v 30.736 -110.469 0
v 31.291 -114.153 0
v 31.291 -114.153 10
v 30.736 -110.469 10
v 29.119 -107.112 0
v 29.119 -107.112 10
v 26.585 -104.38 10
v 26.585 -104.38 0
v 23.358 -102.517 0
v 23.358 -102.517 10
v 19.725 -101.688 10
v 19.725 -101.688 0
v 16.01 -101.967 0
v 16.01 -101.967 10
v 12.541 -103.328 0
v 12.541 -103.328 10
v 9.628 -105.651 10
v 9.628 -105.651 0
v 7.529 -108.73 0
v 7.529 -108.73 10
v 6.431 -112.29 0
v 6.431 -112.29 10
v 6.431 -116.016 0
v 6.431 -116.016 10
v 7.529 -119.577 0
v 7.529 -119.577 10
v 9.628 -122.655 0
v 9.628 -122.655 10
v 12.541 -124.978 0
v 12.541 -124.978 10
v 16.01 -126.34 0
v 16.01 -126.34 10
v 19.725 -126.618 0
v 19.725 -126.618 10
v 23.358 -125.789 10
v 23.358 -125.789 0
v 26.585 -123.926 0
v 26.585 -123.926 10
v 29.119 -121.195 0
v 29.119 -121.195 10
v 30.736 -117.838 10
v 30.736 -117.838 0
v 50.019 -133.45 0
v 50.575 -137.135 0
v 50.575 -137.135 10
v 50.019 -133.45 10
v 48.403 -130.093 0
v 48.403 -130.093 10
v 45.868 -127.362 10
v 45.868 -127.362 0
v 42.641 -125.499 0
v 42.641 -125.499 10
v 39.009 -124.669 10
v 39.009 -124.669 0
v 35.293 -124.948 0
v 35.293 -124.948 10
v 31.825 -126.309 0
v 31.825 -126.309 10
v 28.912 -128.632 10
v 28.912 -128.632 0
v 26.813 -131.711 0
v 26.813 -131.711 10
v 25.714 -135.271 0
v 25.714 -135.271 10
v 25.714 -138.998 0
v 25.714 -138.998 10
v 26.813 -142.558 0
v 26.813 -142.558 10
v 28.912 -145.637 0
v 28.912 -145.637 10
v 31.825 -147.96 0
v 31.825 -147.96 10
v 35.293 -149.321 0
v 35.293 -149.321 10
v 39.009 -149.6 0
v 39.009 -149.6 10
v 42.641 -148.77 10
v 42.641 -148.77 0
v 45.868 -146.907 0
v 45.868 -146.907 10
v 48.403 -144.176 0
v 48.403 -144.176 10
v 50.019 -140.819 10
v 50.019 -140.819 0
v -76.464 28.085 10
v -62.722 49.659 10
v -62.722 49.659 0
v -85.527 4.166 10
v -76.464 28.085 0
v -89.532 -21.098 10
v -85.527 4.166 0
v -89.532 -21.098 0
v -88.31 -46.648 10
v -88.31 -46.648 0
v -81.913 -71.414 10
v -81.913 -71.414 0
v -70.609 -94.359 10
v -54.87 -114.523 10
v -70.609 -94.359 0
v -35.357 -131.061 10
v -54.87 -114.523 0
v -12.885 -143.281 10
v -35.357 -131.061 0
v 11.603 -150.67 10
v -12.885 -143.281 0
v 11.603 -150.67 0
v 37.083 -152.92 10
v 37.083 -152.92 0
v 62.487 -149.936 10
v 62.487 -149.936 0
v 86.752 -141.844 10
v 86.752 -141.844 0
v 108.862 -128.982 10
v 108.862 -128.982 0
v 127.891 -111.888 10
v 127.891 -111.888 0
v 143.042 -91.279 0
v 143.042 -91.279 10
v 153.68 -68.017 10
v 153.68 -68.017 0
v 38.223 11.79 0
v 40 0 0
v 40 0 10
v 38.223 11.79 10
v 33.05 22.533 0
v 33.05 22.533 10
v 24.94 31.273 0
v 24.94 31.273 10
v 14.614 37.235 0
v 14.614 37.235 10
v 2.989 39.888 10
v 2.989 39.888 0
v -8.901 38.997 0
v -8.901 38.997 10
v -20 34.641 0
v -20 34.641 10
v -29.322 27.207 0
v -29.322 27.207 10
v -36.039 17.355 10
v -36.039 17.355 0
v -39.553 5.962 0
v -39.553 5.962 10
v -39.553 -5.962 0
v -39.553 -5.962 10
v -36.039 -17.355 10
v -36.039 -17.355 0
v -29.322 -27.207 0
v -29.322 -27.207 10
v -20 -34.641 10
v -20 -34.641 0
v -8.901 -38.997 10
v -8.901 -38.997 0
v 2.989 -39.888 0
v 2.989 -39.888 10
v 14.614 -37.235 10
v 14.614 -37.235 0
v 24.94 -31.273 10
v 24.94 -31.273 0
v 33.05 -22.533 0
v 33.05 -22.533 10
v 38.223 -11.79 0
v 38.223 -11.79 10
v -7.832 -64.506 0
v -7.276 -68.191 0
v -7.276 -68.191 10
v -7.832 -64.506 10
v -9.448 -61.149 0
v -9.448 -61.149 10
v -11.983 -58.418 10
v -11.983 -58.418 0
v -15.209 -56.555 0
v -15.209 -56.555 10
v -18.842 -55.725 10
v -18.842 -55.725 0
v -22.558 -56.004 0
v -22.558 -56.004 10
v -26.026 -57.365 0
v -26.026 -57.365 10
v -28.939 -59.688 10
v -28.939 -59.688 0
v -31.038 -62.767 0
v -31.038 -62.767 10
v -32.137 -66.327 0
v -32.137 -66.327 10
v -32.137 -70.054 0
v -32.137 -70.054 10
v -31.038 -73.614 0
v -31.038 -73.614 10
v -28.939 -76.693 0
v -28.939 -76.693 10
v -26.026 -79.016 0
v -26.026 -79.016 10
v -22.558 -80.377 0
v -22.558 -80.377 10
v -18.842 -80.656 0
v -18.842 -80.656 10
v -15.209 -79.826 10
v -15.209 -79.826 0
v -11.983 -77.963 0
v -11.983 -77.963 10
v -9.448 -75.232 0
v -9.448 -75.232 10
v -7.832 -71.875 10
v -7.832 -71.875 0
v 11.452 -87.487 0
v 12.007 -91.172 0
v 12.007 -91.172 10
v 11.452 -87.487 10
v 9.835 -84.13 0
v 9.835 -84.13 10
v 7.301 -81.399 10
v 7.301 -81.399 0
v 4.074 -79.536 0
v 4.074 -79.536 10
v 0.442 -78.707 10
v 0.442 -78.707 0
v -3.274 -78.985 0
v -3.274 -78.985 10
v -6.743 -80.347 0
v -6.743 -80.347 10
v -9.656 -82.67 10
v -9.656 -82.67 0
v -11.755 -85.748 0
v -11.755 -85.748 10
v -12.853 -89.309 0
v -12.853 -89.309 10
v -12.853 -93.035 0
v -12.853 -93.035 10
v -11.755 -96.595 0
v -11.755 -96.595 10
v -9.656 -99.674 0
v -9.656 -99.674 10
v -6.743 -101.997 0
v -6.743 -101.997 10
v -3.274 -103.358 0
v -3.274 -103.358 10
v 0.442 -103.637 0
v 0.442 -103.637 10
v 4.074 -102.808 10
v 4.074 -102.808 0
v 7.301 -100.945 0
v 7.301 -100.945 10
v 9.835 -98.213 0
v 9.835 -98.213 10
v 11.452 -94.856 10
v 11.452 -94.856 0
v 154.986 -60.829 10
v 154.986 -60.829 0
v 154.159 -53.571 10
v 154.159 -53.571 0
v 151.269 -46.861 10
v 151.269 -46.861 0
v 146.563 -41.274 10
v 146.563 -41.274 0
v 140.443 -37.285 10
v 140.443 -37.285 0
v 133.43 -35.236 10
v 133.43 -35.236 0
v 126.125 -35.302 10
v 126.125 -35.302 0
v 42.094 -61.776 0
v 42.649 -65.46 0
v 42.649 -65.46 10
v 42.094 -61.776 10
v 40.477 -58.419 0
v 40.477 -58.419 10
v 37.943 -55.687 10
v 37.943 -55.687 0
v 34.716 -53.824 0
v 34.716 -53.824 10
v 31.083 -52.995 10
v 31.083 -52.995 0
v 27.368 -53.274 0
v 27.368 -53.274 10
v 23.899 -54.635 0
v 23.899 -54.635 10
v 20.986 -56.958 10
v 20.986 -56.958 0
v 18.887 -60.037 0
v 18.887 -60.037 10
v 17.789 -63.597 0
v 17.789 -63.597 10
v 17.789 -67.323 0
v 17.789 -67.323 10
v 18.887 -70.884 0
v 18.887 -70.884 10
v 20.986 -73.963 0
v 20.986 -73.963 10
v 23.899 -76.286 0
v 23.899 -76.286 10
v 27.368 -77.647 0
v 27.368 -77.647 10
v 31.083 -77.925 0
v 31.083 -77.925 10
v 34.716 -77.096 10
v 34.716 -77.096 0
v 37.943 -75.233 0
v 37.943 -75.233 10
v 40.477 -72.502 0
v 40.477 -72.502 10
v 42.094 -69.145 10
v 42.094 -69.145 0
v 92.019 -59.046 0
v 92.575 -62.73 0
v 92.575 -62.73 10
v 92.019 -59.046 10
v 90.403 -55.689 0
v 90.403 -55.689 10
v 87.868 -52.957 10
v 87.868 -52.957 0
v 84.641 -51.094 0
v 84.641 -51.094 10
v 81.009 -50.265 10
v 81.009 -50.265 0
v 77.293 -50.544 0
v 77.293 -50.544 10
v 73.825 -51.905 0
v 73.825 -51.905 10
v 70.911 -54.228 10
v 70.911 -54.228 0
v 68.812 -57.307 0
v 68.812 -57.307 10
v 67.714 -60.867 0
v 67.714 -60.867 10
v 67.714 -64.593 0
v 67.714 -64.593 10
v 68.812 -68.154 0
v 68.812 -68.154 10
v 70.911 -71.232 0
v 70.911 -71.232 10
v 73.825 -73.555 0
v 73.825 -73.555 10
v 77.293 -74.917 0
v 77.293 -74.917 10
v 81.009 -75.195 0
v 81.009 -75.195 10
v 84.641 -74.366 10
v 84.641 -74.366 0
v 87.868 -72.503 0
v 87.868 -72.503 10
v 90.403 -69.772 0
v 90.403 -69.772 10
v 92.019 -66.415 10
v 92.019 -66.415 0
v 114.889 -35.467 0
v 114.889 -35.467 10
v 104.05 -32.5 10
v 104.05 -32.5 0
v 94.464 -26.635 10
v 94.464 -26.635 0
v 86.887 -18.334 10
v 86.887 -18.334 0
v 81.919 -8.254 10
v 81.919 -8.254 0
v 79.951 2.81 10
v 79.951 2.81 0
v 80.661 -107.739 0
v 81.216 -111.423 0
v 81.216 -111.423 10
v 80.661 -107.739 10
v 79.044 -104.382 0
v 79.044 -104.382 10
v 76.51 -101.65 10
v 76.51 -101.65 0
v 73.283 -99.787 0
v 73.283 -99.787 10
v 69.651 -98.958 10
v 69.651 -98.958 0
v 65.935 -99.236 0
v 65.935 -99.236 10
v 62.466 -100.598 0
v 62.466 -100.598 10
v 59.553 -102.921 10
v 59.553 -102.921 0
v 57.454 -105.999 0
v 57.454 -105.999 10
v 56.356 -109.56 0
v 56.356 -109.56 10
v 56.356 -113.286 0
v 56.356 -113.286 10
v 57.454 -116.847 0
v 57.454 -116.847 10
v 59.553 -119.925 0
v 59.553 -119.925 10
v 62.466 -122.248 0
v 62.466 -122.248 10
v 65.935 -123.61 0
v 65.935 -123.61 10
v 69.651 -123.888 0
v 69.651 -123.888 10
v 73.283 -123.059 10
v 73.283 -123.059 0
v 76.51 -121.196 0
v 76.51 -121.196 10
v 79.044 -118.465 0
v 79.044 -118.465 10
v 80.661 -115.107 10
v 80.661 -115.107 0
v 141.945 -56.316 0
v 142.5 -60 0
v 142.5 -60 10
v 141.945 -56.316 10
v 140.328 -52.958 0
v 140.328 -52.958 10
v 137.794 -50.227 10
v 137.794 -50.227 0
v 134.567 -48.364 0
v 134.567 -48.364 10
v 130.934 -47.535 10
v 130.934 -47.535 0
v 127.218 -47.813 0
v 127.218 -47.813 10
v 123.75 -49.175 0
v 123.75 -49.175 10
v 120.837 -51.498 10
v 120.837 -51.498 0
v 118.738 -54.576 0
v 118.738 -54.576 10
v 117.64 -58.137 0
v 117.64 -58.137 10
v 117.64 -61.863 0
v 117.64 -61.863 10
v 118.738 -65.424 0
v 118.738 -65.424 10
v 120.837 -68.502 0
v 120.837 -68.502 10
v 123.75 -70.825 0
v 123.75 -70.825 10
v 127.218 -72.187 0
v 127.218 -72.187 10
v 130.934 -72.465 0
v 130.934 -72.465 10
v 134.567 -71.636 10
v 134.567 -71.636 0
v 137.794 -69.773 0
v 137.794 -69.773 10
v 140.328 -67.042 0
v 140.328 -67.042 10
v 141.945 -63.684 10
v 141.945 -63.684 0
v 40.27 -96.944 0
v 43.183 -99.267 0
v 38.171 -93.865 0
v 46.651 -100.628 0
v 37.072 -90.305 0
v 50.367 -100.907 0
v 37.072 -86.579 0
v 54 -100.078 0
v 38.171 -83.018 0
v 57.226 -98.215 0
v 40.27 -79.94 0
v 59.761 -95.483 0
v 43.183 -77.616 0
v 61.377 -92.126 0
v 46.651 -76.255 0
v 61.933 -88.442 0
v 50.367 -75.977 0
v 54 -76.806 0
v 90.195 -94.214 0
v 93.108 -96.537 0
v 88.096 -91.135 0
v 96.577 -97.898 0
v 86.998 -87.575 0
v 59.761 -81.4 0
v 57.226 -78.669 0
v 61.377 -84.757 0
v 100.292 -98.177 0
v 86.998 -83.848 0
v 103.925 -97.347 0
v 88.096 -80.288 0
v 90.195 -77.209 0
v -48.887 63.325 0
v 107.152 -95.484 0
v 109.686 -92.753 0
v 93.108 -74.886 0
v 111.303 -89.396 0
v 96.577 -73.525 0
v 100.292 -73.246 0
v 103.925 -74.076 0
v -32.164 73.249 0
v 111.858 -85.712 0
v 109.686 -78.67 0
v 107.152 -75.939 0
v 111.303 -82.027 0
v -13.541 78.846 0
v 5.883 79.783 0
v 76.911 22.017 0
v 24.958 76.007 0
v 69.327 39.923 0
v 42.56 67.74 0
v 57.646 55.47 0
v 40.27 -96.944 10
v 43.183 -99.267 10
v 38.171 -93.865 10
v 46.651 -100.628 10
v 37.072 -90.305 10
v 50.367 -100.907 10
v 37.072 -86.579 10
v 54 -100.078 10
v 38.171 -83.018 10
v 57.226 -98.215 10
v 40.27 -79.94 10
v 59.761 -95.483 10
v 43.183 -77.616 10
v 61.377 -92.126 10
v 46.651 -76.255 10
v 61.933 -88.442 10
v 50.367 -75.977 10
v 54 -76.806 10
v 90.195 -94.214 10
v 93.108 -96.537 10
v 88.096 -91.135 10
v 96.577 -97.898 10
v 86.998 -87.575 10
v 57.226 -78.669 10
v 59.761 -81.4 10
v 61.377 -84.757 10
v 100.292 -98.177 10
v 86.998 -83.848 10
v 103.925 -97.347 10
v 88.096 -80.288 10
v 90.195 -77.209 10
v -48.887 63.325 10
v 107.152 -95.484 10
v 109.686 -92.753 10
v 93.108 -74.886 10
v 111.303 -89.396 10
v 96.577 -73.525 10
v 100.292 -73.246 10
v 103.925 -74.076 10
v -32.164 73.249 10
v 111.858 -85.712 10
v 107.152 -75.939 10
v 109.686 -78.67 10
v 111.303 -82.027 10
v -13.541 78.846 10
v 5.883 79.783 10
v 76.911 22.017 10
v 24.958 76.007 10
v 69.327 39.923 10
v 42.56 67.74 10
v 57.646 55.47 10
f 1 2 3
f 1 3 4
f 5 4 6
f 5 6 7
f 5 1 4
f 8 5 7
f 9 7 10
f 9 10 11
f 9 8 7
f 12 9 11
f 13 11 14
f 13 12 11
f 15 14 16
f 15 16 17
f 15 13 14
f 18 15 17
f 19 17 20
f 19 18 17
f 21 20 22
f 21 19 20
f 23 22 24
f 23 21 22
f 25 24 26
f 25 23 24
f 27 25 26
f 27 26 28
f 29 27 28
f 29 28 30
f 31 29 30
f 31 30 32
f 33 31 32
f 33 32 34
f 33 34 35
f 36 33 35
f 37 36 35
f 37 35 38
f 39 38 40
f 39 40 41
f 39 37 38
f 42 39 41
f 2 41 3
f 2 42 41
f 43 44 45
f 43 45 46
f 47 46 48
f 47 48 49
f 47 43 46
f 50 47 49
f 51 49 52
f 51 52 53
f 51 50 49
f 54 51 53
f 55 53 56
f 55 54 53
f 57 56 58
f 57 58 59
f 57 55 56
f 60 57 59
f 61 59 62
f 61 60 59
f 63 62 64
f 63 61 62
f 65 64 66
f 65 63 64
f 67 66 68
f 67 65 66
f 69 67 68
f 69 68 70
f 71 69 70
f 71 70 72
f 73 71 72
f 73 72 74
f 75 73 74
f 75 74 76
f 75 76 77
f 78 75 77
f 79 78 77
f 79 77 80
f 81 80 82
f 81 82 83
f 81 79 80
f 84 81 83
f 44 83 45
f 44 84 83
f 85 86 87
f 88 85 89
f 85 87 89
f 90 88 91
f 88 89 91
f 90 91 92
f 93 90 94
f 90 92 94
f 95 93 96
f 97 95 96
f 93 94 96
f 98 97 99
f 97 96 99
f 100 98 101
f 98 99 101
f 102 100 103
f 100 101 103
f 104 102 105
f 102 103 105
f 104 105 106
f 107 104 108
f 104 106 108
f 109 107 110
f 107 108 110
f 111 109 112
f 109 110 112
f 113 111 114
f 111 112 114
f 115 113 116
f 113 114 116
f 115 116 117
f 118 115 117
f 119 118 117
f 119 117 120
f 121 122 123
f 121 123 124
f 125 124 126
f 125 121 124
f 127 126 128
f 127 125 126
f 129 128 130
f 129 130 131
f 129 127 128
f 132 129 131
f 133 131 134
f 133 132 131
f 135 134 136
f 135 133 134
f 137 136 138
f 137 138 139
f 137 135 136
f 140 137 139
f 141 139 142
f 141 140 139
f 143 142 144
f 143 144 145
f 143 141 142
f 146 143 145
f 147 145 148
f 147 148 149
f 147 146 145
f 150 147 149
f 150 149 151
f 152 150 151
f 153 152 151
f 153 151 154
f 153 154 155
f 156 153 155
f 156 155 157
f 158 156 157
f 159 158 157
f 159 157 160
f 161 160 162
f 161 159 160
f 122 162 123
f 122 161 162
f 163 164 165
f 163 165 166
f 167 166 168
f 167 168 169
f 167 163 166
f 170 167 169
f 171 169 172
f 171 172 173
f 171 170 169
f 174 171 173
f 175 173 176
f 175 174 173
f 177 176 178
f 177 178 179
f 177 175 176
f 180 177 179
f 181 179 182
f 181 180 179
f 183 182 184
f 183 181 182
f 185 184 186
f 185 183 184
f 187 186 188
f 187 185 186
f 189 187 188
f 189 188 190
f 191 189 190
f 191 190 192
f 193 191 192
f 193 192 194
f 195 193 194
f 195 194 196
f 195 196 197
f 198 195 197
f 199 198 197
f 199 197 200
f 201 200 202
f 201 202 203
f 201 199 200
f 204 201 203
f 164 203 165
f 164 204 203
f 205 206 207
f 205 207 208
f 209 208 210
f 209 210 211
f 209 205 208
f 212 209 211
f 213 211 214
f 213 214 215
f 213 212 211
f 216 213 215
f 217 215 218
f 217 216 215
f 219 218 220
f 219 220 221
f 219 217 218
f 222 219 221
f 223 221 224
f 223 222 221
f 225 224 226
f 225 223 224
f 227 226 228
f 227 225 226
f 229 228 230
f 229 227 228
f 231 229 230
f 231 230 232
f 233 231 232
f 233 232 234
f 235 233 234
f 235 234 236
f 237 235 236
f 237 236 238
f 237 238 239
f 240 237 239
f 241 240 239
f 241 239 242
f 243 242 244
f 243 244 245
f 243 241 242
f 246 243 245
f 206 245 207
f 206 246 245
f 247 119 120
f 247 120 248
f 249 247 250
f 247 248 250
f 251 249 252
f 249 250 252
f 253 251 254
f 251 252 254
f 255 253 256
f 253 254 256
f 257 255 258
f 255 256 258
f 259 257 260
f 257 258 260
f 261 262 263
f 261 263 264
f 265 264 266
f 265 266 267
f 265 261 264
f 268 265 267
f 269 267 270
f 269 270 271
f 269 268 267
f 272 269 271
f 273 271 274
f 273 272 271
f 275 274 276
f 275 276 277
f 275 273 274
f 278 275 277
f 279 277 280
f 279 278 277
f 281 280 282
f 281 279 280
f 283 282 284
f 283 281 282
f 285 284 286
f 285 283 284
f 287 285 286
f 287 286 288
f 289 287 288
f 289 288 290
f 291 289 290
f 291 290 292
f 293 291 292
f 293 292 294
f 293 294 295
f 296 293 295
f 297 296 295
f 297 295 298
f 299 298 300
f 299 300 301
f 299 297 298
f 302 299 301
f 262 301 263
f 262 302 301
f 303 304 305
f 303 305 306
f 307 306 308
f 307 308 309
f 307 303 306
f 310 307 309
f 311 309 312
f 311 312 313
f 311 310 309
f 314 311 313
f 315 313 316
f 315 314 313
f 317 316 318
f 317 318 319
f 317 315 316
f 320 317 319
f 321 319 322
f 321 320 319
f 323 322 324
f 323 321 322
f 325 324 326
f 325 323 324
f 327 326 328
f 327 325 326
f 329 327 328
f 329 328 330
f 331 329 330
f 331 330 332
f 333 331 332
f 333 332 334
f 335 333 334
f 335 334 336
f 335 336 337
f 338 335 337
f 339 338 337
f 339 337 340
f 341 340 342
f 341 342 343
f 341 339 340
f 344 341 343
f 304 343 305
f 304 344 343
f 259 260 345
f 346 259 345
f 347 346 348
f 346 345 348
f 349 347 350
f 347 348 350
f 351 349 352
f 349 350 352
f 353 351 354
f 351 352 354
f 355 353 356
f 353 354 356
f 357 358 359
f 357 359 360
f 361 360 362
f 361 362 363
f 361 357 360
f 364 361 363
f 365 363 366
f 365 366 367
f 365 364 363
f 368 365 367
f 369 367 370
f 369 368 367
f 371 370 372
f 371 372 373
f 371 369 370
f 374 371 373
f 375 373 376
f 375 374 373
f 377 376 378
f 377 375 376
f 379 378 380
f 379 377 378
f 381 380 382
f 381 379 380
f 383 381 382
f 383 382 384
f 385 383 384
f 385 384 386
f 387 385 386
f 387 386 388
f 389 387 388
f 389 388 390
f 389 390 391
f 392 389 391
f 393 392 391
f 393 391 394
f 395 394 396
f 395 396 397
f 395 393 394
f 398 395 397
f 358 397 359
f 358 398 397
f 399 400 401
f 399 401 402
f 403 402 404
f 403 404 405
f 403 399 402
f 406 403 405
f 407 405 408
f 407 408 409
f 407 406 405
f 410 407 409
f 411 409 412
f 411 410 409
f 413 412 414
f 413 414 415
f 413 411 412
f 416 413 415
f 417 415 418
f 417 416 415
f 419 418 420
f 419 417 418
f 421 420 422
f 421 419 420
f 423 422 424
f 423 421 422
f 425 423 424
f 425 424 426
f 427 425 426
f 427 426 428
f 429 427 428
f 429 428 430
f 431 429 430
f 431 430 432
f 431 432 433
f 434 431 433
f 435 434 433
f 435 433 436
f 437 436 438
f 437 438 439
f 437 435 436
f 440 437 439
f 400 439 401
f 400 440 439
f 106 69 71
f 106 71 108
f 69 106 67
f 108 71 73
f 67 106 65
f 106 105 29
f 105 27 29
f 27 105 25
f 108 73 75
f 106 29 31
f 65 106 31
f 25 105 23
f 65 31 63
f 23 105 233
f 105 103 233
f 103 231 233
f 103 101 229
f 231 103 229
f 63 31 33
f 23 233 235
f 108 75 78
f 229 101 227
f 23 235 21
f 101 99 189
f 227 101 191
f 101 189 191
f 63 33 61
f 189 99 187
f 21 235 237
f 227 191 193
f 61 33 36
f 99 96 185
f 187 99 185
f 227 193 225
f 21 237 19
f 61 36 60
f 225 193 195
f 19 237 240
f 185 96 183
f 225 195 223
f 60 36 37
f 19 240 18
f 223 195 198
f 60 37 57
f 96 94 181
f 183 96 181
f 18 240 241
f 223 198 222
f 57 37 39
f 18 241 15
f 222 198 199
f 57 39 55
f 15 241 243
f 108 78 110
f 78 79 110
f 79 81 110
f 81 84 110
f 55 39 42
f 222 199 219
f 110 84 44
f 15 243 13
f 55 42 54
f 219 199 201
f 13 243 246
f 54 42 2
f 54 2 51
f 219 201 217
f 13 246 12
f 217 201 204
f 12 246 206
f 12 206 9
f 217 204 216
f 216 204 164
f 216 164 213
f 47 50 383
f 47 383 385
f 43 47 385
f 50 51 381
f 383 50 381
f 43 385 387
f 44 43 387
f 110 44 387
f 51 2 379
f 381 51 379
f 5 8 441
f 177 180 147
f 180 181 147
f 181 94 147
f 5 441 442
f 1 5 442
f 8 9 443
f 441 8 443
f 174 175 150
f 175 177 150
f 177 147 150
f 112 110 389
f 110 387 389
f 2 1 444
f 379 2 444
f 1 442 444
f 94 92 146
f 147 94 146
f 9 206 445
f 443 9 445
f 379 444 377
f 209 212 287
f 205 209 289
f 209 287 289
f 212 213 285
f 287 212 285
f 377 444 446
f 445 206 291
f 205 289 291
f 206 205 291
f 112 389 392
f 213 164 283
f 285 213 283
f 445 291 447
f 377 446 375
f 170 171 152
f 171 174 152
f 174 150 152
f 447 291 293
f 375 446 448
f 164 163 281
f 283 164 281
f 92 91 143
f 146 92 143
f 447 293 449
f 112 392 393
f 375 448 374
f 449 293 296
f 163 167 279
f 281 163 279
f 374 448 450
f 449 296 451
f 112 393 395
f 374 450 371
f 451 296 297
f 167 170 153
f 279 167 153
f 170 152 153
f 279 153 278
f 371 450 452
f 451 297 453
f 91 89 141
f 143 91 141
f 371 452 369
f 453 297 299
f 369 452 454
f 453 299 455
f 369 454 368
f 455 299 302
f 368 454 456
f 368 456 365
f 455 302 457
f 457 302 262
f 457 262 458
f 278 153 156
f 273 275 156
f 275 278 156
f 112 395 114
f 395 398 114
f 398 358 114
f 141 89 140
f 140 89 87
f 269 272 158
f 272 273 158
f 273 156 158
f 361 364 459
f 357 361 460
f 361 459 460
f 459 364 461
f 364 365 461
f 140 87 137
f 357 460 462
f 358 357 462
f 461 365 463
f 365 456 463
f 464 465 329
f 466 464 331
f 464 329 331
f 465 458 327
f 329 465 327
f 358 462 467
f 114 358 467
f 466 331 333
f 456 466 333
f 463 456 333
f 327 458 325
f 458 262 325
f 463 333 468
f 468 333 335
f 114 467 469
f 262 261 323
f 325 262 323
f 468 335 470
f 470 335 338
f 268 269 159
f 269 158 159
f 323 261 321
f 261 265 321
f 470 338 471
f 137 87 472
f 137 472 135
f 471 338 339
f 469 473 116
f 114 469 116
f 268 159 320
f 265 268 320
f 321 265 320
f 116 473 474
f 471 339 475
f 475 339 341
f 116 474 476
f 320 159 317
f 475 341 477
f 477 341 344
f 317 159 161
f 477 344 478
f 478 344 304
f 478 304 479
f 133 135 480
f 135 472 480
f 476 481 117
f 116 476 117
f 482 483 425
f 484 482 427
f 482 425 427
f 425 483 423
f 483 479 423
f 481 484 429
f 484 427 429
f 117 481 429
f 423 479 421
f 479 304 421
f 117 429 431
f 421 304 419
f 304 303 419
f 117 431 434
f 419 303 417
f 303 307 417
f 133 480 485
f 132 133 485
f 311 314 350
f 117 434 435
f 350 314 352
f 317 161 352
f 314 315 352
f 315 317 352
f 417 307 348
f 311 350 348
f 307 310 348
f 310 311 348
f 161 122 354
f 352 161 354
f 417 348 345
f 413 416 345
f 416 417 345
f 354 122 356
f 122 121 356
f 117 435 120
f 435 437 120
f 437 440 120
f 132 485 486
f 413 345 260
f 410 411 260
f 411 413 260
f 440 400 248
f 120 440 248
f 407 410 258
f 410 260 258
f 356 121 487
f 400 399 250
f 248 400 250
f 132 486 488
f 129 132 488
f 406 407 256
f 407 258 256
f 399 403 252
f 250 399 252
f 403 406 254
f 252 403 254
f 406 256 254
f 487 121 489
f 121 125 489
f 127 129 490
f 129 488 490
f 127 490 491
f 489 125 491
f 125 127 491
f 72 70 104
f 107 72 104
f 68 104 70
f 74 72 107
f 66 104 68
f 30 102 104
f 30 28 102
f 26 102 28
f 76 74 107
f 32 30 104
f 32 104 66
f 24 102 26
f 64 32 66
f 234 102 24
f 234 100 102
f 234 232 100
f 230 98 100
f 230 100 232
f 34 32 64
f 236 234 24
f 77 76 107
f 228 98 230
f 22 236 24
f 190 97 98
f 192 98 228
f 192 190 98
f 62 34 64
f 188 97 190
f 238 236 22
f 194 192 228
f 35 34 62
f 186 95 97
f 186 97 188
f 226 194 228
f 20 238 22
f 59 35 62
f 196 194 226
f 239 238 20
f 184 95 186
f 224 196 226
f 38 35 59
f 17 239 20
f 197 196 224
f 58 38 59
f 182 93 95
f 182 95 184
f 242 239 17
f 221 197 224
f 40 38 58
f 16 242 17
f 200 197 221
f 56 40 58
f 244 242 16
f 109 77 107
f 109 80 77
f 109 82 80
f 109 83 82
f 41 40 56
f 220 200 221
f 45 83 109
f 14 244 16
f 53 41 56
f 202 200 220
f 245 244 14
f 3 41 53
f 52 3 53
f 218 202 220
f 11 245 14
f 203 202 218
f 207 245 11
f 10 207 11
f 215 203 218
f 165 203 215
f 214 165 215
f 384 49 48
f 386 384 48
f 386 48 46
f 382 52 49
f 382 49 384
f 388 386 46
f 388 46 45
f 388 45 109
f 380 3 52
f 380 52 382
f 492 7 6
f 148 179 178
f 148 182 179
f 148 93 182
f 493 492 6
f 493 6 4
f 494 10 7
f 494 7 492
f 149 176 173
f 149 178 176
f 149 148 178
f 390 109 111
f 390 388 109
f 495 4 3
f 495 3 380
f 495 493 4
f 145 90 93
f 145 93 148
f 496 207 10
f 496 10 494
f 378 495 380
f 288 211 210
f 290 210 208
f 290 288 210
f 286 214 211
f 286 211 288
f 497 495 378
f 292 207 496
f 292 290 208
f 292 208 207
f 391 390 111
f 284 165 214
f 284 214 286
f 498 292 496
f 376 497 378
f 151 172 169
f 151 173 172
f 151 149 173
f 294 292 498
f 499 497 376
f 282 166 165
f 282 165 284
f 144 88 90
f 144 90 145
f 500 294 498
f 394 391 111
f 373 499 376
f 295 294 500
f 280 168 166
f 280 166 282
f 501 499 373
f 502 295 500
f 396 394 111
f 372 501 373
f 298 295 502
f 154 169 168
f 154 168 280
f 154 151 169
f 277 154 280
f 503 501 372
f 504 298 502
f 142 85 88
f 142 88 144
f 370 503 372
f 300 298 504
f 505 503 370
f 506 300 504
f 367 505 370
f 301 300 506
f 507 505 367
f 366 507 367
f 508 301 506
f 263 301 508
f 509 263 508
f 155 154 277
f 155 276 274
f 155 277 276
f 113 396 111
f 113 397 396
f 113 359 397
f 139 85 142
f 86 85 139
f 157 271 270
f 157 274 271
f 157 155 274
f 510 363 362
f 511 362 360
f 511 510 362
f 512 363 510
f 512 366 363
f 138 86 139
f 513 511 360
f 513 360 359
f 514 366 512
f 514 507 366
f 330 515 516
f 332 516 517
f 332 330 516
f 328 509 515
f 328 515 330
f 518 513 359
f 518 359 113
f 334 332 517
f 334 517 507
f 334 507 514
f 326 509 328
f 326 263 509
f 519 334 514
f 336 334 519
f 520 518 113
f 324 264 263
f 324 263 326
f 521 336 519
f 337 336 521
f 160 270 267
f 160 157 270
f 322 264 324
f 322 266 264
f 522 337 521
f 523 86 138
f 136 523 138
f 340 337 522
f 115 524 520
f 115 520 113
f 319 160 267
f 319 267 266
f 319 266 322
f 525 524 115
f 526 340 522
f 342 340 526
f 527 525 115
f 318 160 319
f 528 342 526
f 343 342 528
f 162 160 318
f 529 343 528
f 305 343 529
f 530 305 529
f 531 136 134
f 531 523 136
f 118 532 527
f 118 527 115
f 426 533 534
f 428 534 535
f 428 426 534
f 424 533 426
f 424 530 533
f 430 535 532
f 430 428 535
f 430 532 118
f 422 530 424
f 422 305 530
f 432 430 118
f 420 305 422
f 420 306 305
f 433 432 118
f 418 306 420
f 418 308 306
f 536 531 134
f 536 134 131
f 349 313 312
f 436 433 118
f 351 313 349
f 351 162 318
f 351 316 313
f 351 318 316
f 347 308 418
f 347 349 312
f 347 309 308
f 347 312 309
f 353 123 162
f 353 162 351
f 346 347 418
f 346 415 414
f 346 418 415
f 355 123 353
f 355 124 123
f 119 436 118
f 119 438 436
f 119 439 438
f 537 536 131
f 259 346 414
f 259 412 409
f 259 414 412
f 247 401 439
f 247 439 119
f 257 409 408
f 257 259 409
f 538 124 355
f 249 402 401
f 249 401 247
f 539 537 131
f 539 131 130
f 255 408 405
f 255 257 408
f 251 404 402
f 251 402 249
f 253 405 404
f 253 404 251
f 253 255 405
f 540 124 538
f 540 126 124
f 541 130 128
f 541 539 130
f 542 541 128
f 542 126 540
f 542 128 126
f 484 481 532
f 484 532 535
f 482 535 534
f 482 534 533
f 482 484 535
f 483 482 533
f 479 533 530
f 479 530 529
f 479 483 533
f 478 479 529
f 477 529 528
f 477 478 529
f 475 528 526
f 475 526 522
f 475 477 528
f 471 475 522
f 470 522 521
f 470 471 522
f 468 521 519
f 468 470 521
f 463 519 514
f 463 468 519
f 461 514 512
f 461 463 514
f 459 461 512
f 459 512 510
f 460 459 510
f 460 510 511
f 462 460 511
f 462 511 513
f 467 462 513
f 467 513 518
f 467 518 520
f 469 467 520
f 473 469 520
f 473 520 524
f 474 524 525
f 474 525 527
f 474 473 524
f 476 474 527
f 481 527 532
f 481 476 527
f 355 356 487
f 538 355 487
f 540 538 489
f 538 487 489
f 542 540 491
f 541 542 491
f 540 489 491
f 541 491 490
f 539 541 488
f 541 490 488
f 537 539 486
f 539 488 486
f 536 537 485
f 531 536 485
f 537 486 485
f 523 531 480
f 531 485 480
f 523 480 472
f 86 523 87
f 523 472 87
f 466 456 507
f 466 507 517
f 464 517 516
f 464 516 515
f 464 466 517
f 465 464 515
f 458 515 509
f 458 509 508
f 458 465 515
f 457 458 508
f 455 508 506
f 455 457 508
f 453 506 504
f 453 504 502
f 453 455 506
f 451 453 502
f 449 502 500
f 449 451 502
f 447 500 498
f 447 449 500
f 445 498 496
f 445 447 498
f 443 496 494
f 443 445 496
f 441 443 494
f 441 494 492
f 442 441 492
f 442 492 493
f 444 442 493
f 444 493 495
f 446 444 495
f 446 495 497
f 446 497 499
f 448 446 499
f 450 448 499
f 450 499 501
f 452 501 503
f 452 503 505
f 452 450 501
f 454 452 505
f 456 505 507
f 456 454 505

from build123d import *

# Parameters (mm, degrees)
CROQUIS1_R              = 40
CROQUIS1_R_2            = 12.5
SALIENTE_EXTRUIR1_DEPTH = 10


with BuildPart() as part:
    # Croquis1 → Saliente-Extruir1 (new body)
    with BuildSketch(Plane.XY):
        with BuildLine():
            ThreePointArc((79.950643702, 2.809728022), (24.958439712, 76.007080507), (-62.721500941, 49.658970184))
            ThreePointArc((-62.721500941, 49.658970184), (-24.43428434, -137.747119815), (153.67978893, -68.016707318))
            ThreePointArc((153.67978893, -68.016707318), (149.121265752, -43.894808413), (126.125371367, -35.302079987))
            ThreePointArc((126.125371367, -35.302079987), (94.463628593, -26.634547282), (79.950643702, 2.809728022))
        make_face()
        Circle(CROQUIS1_R, mode=Mode.SUBTRACT)
        with Locations((130, -60)):
            Circle(CROQUIS1_R_2, mode=Mode.SUBTRACT)
        with Locations((99.358222275, -85.711504387)):
            Circle(CROQUIS1_R_2, mode=Mode.SUBTRACT)
        with Locations((68.71644455, -111.423008775)):
            Circle(CROQUIS1_R_2, mode=Mode.SUBTRACT)
        with Locations((38.074666826, -137.134513162)):
            Circle(CROQUIS1_R_2, mode=Mode.SUBTRACT)
        with Locations((80.074593985, -62.730171094)):
            Circle(CROQUIS1_R_2, mode=Mode.SUBTRACT)
        with Locations((49.43281626, -88.441675481)):
            Circle(CROQUIS1_R_2, mode=Mode.SUBTRACT)
        with Locations((18.791038535, -114.153179869)):
            Circle(CROQUIS1_R_2, mode=Mode.SUBTRACT)
        with Locations((30.149187969, -65.460342188)):
            Circle(CROQUIS1_R_2, mode=Mode.SUBTRACT)
        with Locations((-0.492589755, -91.171846575)):
            Circle(CROQUIS1_R_2, mode=Mode.SUBTRACT)
        with Locations((-19.776218046, -68.190513282)):
            Circle(CROQUIS1_R_2, mode=Mode.SUBTRACT)
    extrude(amount=SALIENTE_EXTRUIR1_DEPTH)


solid = part.part
